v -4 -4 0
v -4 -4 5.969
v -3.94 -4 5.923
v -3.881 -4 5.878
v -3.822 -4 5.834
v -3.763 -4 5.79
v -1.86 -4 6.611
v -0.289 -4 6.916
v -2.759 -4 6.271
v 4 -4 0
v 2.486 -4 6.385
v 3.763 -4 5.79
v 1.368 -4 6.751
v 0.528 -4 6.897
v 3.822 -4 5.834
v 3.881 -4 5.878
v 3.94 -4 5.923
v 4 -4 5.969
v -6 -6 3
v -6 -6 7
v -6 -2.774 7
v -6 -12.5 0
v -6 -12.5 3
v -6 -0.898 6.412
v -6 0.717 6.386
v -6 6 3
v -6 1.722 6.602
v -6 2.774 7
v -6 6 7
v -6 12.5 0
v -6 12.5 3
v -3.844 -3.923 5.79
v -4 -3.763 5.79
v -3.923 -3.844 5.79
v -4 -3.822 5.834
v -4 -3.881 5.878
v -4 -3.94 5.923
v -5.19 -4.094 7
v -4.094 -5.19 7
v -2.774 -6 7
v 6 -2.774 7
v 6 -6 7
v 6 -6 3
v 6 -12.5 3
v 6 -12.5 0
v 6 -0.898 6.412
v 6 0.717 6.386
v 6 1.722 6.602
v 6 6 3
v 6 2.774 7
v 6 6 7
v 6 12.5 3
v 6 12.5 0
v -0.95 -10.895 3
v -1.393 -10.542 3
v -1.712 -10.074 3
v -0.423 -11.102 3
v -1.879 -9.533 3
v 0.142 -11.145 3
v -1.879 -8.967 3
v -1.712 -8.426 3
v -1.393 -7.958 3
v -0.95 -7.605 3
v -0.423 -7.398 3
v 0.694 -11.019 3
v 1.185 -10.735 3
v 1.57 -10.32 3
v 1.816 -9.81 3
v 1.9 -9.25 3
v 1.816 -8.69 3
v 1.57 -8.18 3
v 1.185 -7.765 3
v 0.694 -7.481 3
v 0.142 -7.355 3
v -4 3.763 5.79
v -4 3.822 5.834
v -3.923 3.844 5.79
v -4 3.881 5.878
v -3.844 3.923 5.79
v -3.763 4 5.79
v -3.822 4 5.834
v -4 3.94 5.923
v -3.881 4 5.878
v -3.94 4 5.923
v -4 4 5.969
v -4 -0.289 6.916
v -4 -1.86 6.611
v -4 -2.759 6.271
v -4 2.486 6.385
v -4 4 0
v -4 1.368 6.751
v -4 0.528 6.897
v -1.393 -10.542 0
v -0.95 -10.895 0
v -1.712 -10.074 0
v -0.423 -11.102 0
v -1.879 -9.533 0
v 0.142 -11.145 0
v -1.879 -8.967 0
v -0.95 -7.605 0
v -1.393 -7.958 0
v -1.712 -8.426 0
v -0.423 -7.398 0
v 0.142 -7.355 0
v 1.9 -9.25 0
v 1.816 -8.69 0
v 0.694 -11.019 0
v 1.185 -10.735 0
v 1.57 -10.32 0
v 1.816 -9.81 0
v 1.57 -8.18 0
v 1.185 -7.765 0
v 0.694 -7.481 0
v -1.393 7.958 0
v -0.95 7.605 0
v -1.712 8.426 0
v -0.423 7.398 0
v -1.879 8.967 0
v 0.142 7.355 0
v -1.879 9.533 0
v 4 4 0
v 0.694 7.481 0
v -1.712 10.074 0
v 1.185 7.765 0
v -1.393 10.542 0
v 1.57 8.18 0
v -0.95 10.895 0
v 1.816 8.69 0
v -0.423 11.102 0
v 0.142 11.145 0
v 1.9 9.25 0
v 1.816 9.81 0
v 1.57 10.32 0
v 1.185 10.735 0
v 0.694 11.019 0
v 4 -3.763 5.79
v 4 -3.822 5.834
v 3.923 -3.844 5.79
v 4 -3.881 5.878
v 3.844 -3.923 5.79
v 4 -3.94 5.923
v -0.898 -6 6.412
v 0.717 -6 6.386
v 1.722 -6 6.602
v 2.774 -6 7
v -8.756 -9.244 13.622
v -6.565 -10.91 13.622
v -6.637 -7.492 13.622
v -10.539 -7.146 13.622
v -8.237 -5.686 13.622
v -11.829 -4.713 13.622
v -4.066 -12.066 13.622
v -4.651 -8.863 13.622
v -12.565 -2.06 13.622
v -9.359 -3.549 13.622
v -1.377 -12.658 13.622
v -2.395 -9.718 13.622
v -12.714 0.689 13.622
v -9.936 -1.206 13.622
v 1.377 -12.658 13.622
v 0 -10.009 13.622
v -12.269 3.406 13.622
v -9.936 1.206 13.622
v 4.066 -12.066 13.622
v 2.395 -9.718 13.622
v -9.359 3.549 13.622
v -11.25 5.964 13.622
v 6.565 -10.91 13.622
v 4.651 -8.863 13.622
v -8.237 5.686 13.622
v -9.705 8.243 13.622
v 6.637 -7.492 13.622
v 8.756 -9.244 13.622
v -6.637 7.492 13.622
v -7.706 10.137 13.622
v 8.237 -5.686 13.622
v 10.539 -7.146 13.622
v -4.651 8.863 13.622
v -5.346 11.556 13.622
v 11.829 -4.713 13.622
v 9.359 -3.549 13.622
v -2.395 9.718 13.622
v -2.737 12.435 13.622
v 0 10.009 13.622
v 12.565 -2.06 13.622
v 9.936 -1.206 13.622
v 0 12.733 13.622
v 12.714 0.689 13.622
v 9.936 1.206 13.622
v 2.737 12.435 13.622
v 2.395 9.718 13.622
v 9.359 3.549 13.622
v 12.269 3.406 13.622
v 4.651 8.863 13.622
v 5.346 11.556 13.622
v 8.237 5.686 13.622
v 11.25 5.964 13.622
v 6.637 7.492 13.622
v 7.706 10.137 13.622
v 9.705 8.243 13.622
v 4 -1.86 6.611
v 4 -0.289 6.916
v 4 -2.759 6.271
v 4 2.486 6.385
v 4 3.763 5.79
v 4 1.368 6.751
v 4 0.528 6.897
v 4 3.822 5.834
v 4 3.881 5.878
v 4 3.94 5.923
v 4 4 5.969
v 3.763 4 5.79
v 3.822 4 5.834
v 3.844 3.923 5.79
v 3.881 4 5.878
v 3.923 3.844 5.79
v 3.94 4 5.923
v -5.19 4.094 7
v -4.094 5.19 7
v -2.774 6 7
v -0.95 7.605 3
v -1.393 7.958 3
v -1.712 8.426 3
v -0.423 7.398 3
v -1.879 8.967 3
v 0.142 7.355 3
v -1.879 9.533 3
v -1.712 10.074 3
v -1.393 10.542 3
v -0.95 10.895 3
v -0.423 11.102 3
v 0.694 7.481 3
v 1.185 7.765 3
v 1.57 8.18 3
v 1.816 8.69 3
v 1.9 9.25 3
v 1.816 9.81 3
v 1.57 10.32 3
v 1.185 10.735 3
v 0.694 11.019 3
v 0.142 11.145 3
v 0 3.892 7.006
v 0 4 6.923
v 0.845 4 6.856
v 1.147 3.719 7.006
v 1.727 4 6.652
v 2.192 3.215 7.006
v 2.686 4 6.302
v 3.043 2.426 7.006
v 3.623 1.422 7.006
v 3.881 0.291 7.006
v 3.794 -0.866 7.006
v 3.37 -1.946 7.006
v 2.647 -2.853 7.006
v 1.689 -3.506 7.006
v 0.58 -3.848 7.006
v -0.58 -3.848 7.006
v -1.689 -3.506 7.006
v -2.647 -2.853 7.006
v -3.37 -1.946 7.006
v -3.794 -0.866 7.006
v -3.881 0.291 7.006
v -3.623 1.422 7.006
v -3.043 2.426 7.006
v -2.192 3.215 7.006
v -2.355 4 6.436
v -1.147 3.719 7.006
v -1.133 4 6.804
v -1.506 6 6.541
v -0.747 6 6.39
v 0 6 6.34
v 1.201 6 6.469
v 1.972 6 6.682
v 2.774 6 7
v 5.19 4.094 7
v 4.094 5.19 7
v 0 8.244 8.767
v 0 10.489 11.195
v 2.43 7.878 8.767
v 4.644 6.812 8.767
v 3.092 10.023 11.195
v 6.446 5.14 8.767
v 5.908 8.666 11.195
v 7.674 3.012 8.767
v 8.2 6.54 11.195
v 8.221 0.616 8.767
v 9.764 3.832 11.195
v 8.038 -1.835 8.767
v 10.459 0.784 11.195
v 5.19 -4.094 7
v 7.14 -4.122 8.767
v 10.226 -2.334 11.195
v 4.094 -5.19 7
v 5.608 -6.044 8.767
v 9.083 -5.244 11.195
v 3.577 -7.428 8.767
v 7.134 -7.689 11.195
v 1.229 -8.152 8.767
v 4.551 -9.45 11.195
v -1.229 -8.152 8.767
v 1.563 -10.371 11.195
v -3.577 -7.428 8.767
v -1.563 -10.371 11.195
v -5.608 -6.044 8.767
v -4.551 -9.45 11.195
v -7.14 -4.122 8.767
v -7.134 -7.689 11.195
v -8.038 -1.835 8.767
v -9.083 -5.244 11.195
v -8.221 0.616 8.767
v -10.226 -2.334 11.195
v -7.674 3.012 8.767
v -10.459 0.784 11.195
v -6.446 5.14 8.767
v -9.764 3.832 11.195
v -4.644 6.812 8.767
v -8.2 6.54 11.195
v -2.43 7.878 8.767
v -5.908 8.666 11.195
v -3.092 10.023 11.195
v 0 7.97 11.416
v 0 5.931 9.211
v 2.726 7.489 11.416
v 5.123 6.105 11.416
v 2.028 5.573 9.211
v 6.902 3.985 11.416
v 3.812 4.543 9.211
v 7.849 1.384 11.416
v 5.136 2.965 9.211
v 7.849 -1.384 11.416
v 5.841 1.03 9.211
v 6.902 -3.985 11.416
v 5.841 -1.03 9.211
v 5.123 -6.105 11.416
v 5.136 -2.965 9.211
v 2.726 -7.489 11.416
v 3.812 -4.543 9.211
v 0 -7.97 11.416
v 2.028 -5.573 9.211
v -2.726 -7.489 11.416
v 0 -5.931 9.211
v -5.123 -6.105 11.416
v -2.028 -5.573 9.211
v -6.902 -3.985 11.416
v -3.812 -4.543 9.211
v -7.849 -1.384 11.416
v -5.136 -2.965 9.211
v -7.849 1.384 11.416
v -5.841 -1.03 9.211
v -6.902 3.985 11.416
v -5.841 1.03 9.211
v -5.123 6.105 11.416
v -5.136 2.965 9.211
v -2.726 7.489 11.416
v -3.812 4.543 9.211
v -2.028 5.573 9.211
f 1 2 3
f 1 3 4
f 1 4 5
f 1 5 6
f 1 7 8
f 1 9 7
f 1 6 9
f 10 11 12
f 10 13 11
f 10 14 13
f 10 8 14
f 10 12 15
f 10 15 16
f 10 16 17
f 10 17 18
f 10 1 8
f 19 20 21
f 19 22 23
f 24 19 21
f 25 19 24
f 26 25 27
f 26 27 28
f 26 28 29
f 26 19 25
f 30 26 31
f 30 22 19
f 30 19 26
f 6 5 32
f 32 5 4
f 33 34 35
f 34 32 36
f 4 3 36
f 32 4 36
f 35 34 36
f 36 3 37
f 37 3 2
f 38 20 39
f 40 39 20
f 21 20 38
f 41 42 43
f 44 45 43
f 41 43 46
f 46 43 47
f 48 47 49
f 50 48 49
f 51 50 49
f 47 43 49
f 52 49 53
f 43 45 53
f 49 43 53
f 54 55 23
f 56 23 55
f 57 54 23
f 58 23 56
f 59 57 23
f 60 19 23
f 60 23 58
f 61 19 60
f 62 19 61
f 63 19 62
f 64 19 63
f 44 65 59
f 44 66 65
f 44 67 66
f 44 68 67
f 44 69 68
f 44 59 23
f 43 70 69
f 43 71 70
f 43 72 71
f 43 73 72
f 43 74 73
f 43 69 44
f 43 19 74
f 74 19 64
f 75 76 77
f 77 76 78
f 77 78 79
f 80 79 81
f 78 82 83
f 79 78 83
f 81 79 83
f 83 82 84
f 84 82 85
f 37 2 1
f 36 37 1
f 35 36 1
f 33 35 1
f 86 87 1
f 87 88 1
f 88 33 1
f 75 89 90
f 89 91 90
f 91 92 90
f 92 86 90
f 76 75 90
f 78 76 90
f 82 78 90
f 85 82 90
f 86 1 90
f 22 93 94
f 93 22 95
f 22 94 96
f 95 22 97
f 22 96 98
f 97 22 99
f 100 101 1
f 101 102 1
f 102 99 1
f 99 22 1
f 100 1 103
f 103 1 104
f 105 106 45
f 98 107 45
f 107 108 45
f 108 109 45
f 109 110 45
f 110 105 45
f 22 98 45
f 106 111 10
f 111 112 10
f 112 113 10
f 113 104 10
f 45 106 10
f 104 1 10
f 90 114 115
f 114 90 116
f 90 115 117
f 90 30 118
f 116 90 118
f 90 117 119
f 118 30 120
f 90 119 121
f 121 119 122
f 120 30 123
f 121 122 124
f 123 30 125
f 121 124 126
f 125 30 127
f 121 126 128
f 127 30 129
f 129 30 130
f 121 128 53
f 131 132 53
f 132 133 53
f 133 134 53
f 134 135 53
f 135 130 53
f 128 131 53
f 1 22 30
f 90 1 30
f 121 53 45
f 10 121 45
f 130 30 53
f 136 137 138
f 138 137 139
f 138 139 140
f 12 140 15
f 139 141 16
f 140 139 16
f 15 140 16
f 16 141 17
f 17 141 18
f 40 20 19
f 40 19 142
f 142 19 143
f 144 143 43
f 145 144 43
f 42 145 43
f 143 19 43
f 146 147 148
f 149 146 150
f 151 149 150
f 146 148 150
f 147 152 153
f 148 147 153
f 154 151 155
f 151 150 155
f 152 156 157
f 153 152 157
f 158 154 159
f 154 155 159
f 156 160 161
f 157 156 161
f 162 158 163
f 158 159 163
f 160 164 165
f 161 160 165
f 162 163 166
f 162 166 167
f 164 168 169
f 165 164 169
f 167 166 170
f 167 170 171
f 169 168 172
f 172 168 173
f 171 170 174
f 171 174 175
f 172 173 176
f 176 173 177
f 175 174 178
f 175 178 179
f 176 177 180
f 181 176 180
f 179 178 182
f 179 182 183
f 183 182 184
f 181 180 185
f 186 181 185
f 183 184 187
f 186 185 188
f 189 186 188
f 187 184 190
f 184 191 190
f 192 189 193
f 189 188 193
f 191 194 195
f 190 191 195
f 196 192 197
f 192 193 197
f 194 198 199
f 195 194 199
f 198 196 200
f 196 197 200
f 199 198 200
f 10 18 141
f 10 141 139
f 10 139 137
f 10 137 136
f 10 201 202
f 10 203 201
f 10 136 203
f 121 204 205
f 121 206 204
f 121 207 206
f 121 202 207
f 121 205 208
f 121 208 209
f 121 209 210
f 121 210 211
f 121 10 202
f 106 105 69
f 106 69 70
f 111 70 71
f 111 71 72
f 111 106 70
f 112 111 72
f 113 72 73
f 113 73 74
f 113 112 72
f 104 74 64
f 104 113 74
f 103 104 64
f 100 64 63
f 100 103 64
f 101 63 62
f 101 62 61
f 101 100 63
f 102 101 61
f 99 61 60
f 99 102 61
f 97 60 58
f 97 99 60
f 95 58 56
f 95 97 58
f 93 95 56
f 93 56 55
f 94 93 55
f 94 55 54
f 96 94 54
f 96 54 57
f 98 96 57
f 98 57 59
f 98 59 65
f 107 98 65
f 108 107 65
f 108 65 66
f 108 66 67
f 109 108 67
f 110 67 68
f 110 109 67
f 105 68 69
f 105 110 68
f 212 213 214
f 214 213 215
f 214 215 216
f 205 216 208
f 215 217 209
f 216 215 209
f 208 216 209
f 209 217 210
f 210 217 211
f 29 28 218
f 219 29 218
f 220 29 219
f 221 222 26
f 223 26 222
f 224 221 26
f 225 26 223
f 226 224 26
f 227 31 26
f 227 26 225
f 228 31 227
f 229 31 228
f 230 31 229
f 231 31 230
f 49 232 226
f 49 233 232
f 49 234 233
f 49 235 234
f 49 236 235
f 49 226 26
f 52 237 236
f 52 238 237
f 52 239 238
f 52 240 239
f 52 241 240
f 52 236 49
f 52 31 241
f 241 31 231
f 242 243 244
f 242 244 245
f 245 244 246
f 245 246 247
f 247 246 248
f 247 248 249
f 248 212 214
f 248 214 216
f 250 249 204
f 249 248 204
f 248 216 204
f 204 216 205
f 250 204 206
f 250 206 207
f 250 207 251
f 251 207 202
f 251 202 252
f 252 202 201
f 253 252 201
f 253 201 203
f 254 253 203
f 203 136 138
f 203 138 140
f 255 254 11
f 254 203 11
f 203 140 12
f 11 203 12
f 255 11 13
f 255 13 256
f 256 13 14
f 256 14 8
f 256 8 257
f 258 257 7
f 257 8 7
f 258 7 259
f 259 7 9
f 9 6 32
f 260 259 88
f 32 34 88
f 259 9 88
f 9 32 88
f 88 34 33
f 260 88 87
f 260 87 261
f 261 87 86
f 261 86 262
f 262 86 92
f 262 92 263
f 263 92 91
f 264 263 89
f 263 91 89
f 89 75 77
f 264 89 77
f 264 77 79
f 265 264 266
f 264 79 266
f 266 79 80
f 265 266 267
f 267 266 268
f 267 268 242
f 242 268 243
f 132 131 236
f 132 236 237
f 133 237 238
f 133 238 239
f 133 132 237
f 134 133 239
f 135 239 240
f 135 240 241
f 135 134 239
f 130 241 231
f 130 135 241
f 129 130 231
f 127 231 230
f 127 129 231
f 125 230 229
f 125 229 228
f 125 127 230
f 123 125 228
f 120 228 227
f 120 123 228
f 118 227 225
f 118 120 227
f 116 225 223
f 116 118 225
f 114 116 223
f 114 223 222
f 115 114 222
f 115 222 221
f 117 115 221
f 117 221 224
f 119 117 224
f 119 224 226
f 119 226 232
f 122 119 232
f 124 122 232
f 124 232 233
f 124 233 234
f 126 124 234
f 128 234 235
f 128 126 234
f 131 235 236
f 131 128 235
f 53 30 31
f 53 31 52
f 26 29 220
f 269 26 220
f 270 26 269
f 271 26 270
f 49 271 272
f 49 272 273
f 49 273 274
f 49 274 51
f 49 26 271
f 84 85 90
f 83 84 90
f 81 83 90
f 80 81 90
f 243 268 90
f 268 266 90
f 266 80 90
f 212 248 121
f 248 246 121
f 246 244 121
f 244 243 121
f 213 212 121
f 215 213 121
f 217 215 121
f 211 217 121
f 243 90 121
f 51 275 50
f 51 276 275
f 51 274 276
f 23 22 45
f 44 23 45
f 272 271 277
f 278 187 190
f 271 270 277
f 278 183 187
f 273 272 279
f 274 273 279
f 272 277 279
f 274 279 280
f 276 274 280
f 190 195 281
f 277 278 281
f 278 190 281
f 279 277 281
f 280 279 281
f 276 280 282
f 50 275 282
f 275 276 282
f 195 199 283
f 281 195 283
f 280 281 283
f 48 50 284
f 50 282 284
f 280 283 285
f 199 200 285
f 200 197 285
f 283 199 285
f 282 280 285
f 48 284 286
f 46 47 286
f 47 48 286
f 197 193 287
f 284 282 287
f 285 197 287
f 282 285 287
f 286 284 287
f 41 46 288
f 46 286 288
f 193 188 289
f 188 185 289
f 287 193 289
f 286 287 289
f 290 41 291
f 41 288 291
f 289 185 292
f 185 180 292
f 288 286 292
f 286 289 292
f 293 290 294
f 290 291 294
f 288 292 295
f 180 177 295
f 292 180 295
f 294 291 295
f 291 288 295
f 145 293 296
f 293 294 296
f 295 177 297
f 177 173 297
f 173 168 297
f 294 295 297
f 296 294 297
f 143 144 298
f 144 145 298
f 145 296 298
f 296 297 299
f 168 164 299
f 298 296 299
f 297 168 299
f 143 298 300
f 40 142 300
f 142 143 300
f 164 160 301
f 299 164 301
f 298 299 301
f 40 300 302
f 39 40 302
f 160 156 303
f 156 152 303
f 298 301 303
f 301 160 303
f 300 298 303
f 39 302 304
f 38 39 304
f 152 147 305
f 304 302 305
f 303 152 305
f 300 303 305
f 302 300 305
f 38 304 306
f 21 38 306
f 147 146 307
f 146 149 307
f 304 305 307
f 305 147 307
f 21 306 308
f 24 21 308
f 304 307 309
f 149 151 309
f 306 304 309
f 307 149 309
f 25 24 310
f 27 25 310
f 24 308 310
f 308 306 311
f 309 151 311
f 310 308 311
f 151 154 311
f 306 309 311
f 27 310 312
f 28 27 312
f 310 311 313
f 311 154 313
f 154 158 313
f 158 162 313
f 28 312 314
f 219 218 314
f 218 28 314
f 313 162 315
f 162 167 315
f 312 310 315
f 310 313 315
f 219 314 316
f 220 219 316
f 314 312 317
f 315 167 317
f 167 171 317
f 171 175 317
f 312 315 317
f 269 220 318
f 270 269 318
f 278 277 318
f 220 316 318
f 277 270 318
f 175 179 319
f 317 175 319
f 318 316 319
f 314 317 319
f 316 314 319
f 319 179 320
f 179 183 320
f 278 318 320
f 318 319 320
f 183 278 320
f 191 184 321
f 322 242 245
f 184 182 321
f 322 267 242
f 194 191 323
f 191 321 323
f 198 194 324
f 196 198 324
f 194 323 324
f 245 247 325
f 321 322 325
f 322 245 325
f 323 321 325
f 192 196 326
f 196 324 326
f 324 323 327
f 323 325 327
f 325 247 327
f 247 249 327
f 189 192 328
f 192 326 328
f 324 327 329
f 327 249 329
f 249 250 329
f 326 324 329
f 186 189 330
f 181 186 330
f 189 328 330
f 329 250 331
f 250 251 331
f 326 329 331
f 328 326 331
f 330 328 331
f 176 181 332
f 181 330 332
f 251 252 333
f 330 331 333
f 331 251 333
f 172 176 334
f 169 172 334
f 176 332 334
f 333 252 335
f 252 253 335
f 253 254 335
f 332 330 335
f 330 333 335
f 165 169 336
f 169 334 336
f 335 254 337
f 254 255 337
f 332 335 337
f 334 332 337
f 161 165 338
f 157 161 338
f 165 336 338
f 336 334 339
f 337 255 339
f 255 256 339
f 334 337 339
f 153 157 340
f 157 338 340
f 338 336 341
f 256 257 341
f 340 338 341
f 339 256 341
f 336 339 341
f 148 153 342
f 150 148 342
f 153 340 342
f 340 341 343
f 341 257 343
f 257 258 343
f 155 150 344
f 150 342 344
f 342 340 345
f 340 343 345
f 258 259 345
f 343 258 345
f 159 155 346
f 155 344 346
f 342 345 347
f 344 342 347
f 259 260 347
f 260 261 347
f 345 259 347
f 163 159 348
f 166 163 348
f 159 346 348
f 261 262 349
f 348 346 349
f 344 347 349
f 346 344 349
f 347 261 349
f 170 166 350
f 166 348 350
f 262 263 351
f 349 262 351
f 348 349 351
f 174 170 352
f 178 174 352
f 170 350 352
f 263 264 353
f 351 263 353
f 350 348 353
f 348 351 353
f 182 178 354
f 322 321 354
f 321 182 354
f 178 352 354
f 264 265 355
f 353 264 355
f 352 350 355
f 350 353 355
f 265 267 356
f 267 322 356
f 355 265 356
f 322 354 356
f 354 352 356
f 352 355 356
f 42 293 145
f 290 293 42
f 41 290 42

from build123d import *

# Parameters (mm, degrees)
F0_W     = 12
F0_H     = 25
F0_R     = 1.9
F0_W_2   = 8
F0_H_2   = 8
F1_DEPTH = 3
F2_W     = 12
F2_H     = 12
F2_W_2   = 8
F2_H_2   = 8
F3_DEPTH = 4


with BuildPart() as f1:
    # F0 (on Top) → F1 (new body)
    with BuildSketch(Plane.XY):
        Rectangle(F0_W, F0_H)
        with Locations((0, -9.25)):
            Circle(F0_R, mode=Mode.SUBTRACT)
        Rectangle(F0_W_2, F0_H_2, mode=Mode.SUBTRACT)
        with Locations((0, 9.25)):
            Circle(F0_R, mode=Mode.SUBTRACT)
    extrude(amount=F1_DEPTH)

    # F2 (on face) → F3 (join)
    with BuildSketch(Plane.XY.offset(3)):
        Rectangle(F2_W, F2_H)
        Rectangle(F2_W_2, F2_H_2, mode=Mode.SUBTRACT)
    extrude(amount=F3_DEPTH)

    # F5 (on Right) → F6 (revolve)
    with BuildSketch(Plane.YZ):
        Polygon((3.891662, 7.005772), (5.491862, 5.790449), (12.732967, 13.621861), (10.009052, 13.621861), align=None)
    revolve(axis=Axis((0, 0, 7.370598), (0, 0, -1)))


solid = f1.part
